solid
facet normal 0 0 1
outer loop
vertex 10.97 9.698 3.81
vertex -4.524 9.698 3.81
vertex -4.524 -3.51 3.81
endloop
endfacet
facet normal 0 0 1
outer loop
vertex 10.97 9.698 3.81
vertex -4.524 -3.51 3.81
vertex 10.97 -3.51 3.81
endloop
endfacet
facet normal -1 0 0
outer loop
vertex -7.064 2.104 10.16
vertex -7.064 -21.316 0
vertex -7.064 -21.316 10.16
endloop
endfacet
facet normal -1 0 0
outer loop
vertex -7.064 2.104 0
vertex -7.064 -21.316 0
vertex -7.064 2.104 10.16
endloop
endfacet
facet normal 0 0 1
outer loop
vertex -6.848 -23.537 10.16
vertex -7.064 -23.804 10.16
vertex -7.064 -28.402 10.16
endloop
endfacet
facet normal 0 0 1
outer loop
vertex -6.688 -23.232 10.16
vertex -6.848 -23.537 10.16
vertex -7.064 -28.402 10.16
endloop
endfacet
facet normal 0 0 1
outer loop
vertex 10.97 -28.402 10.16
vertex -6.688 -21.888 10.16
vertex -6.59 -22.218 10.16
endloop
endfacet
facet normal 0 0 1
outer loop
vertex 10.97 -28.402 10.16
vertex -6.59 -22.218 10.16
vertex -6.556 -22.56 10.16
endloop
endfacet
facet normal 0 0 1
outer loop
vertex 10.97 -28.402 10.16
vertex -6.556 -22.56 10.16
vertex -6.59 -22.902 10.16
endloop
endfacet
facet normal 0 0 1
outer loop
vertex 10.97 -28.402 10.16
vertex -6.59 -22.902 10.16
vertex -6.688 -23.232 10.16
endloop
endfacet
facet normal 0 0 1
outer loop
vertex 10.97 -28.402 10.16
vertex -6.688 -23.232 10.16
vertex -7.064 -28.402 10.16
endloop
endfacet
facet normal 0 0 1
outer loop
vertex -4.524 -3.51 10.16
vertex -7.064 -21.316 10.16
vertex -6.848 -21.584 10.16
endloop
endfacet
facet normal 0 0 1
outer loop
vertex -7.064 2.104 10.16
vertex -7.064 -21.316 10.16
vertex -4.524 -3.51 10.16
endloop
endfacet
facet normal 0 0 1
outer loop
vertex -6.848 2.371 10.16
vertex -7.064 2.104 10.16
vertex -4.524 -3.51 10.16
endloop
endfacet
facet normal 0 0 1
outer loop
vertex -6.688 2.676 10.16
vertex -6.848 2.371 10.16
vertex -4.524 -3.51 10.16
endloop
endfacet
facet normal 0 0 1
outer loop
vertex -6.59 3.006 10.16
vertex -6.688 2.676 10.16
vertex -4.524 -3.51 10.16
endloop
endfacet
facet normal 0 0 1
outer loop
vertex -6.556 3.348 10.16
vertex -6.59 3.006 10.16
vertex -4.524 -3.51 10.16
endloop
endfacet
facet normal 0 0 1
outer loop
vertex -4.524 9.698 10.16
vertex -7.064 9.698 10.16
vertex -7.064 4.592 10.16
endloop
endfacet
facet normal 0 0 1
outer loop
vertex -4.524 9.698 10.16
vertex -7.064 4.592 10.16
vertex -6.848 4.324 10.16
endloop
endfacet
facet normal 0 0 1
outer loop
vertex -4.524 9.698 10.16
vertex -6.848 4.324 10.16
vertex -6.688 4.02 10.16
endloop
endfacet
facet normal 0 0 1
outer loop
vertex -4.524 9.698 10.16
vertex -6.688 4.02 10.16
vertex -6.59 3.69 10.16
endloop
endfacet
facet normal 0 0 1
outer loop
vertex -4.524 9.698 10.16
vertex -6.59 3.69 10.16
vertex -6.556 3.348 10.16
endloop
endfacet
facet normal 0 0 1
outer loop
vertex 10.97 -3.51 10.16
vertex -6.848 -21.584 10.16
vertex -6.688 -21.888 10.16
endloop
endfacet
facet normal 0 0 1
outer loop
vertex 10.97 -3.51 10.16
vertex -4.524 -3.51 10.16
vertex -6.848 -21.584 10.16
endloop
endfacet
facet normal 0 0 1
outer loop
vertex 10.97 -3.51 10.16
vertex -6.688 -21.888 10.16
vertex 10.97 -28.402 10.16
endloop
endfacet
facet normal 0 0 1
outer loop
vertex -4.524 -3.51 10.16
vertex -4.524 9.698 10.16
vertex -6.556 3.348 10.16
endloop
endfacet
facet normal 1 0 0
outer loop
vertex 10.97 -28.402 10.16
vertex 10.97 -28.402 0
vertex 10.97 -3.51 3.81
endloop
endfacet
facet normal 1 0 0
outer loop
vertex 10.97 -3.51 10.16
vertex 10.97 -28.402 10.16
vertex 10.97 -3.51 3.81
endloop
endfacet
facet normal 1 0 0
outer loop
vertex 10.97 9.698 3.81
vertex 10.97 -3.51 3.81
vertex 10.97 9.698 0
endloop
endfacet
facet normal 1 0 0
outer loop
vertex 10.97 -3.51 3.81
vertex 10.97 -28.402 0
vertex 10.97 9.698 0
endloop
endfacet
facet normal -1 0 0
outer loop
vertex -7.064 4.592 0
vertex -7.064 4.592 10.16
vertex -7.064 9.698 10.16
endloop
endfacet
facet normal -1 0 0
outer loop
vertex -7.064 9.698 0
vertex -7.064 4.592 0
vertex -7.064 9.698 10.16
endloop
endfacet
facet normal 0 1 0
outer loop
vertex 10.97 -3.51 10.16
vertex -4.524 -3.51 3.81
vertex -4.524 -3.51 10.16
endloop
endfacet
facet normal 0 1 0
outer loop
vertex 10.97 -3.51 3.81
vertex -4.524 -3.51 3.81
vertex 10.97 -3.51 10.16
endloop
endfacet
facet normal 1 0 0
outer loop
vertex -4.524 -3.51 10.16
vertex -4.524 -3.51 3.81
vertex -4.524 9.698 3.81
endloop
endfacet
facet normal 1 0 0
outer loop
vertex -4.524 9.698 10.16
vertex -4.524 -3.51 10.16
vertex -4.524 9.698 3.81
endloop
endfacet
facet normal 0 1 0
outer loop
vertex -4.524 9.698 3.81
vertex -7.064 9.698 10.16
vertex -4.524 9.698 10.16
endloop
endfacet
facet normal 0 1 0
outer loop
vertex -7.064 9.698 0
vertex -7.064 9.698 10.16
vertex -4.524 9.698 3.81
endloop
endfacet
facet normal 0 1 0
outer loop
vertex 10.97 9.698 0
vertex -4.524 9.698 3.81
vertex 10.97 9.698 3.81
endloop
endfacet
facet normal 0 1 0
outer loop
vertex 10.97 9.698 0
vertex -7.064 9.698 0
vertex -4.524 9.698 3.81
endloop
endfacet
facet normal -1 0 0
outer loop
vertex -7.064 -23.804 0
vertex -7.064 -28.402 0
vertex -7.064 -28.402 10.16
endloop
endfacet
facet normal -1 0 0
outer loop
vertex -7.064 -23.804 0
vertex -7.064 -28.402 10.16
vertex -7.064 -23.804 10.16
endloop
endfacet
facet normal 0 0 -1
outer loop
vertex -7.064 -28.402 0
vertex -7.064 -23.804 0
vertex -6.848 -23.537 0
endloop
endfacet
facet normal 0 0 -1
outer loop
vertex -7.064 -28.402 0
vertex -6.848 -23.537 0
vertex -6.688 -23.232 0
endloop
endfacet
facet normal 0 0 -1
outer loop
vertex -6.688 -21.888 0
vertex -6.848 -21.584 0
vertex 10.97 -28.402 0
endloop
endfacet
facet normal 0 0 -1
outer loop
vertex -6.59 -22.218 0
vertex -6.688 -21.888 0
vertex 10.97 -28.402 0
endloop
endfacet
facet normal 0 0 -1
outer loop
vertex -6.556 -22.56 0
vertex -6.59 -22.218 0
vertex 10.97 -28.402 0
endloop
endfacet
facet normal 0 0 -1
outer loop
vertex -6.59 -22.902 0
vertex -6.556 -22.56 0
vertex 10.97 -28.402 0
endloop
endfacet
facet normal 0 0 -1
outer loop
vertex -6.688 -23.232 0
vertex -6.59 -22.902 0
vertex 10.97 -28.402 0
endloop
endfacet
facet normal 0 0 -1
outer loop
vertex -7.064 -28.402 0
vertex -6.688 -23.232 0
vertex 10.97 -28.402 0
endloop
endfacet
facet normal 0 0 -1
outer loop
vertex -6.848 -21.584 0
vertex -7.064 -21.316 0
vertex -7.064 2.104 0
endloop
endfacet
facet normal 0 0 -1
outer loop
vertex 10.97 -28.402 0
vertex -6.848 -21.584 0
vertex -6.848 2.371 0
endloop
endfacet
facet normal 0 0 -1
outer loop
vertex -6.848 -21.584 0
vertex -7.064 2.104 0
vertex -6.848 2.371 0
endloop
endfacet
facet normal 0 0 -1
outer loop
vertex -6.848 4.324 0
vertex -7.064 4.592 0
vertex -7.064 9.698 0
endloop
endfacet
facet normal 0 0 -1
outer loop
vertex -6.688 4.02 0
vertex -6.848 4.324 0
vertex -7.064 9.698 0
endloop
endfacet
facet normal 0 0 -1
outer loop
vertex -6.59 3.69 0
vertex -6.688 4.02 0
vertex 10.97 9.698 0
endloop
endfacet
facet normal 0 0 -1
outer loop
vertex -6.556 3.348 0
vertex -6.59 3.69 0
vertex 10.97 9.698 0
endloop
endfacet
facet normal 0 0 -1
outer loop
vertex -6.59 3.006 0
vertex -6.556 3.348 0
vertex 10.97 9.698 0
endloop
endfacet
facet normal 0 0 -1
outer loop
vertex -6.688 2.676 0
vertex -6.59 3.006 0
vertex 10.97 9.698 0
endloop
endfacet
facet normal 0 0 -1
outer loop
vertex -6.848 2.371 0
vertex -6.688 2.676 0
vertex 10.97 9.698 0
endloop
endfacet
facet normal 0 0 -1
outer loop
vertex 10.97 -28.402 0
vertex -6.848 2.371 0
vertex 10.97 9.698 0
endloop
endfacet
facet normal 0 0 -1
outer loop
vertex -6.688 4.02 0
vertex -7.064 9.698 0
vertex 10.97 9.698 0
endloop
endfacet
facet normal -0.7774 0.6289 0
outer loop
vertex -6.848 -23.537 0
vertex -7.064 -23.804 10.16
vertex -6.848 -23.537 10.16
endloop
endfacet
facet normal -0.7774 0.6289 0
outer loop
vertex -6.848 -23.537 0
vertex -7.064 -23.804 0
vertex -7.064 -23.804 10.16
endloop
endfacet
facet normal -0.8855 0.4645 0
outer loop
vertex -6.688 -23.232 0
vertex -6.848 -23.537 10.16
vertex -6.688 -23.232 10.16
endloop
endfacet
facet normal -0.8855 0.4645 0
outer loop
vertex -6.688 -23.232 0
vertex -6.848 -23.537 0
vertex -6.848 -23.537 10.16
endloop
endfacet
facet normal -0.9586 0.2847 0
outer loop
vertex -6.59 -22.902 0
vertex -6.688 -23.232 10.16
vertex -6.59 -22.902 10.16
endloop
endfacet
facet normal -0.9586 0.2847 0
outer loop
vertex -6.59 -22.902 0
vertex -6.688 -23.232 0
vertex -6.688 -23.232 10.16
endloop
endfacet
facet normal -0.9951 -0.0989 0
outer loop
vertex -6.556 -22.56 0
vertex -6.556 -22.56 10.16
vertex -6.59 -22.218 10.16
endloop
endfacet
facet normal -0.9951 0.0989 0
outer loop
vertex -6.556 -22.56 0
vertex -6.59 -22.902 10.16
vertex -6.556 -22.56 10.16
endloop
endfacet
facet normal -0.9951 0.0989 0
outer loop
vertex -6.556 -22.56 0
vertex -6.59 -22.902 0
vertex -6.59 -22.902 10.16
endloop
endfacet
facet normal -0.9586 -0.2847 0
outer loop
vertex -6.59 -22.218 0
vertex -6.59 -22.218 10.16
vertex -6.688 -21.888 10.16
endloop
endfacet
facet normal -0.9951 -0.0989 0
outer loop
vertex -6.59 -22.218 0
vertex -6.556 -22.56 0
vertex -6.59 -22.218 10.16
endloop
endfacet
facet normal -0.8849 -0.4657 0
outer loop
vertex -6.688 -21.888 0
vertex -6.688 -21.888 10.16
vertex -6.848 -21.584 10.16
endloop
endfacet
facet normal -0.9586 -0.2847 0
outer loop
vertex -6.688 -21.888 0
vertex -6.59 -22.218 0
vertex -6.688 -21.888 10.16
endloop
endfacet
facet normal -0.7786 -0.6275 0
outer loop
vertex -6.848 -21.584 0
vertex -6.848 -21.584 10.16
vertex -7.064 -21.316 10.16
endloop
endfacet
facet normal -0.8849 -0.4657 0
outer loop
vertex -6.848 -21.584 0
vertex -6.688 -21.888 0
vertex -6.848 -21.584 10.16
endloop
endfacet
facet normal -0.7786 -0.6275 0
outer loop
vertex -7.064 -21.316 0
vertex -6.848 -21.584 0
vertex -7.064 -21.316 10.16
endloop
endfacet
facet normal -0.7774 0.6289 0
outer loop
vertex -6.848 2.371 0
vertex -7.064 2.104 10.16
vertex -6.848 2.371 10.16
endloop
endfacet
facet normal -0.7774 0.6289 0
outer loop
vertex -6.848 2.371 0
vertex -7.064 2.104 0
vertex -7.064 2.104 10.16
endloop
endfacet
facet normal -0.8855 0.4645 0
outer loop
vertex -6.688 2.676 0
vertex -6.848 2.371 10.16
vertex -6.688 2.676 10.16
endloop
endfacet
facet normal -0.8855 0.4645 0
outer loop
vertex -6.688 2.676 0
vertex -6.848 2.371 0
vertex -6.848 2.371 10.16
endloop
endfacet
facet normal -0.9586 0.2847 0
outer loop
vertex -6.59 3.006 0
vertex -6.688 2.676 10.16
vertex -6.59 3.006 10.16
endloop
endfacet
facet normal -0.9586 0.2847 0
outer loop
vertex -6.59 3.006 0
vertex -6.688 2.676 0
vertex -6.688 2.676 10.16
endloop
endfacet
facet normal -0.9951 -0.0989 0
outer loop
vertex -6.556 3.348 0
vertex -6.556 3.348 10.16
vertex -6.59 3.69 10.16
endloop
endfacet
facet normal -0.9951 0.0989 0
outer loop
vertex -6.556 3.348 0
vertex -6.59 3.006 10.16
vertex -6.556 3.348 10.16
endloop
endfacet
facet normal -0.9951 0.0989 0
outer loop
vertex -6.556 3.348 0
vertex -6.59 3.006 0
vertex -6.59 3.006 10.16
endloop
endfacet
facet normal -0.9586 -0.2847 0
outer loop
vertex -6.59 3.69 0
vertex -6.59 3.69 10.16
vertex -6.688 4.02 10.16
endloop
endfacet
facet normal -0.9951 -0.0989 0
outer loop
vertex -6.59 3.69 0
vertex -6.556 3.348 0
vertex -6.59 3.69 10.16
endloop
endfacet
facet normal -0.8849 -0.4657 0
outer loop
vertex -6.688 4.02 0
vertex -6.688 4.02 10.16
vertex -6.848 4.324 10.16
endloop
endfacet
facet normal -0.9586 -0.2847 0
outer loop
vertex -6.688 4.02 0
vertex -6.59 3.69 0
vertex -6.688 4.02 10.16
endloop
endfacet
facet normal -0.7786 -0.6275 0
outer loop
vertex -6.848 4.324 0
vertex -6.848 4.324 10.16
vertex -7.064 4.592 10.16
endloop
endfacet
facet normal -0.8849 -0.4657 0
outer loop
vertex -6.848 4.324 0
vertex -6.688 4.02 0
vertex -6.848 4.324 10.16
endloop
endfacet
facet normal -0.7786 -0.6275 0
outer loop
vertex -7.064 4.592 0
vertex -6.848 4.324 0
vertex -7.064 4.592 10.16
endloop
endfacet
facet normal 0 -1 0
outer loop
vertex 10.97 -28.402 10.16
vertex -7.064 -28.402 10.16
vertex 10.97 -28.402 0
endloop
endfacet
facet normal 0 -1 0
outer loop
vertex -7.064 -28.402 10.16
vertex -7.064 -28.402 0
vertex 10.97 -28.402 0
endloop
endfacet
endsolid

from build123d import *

# Parameters (mm, degrees)
SKETCH1_W           = 18.034
SKETCH1_H           = 38.1
BOSS_EXTRUDE1_DEPTH = 3.81
SKETCH2_W           = 2.54
SKETCH2_H           = 38.1
SKETCH2_H_2         = 24.892
BOSS_EXTRUDE2_DEPTH = 6.35
SKETCH4_W           = 12.954
SKETCH4_H           = 3.17934121
BOSS_EXTRUDE4_DEPTH = 6.35
SKETCH6_R           = 1.778
CUT_EXTRUDE1_DEPTH  = 12.192
SKETCH7_W           = 12.954
SKETCH7_H           = 21.71265879
BOSS_EXTRUDE5_DEPTH = 6.35


with BuildPart() as part:
    # Sketch1 → Boss-Extrude1 (new body)
    with BuildSketch(Plane.XY):
        with Locations((1.952722402, -9.352060056)):
            Rectangle(SKETCH1_W, SKETCH1_H)
    extrude(amount=BOSS_EXTRUDE1_DEPTH)

    # Sketch2 → Boss-Extrude2 (add)
    with BuildSketch(Plane.XY.offset(3.81)):
        with Locations((-5.794277598, -9.352060056)):
            Rectangle(SKETCH2_W, SKETCH2_H)
        with Locations((9.699722402, -15.956060056)):
            Rectangle(SKETCH2_W, SKETCH2_H_2)
    extrude(amount=BOSS_EXTRUDE2_DEPTH)

    # Sketch4 → Boss-Extrude4 (add)
    with BuildSketch(Plane.XY.offset(3.81)):
        with Locations((1.952722402, -5.099730661)):
            Rectangle(SKETCH4_W, SKETCH4_H)
    extrude(amount=BOSS_EXTRUDE4_DEPTH)

    # Sketch6 → Cut-Extrude1 (cut)
    with BuildSketch(Plane.XY):
        with Locations((-8.334277598, 3.347939944)):
            Circle(SKETCH6_R)
        with Locations((-8.334277598, -22.560060056)):
            Circle(SKETCH6_R)
    extrude(amount=CUT_EXTRUDE1_DEPTH, mode=Mode.SUBTRACT)

    # Sketch7 → Boss-Extrude5 (add)
    with BuildSketch(Plane.XY.offset(3.81)):
        with Locations((1.952722402, -17.545730661)):
            Rectangle(SKETCH7_W, SKETCH7_H)
    extrude(amount=BOSS_EXTRUDE5_DEPTH)


solid = part.part
